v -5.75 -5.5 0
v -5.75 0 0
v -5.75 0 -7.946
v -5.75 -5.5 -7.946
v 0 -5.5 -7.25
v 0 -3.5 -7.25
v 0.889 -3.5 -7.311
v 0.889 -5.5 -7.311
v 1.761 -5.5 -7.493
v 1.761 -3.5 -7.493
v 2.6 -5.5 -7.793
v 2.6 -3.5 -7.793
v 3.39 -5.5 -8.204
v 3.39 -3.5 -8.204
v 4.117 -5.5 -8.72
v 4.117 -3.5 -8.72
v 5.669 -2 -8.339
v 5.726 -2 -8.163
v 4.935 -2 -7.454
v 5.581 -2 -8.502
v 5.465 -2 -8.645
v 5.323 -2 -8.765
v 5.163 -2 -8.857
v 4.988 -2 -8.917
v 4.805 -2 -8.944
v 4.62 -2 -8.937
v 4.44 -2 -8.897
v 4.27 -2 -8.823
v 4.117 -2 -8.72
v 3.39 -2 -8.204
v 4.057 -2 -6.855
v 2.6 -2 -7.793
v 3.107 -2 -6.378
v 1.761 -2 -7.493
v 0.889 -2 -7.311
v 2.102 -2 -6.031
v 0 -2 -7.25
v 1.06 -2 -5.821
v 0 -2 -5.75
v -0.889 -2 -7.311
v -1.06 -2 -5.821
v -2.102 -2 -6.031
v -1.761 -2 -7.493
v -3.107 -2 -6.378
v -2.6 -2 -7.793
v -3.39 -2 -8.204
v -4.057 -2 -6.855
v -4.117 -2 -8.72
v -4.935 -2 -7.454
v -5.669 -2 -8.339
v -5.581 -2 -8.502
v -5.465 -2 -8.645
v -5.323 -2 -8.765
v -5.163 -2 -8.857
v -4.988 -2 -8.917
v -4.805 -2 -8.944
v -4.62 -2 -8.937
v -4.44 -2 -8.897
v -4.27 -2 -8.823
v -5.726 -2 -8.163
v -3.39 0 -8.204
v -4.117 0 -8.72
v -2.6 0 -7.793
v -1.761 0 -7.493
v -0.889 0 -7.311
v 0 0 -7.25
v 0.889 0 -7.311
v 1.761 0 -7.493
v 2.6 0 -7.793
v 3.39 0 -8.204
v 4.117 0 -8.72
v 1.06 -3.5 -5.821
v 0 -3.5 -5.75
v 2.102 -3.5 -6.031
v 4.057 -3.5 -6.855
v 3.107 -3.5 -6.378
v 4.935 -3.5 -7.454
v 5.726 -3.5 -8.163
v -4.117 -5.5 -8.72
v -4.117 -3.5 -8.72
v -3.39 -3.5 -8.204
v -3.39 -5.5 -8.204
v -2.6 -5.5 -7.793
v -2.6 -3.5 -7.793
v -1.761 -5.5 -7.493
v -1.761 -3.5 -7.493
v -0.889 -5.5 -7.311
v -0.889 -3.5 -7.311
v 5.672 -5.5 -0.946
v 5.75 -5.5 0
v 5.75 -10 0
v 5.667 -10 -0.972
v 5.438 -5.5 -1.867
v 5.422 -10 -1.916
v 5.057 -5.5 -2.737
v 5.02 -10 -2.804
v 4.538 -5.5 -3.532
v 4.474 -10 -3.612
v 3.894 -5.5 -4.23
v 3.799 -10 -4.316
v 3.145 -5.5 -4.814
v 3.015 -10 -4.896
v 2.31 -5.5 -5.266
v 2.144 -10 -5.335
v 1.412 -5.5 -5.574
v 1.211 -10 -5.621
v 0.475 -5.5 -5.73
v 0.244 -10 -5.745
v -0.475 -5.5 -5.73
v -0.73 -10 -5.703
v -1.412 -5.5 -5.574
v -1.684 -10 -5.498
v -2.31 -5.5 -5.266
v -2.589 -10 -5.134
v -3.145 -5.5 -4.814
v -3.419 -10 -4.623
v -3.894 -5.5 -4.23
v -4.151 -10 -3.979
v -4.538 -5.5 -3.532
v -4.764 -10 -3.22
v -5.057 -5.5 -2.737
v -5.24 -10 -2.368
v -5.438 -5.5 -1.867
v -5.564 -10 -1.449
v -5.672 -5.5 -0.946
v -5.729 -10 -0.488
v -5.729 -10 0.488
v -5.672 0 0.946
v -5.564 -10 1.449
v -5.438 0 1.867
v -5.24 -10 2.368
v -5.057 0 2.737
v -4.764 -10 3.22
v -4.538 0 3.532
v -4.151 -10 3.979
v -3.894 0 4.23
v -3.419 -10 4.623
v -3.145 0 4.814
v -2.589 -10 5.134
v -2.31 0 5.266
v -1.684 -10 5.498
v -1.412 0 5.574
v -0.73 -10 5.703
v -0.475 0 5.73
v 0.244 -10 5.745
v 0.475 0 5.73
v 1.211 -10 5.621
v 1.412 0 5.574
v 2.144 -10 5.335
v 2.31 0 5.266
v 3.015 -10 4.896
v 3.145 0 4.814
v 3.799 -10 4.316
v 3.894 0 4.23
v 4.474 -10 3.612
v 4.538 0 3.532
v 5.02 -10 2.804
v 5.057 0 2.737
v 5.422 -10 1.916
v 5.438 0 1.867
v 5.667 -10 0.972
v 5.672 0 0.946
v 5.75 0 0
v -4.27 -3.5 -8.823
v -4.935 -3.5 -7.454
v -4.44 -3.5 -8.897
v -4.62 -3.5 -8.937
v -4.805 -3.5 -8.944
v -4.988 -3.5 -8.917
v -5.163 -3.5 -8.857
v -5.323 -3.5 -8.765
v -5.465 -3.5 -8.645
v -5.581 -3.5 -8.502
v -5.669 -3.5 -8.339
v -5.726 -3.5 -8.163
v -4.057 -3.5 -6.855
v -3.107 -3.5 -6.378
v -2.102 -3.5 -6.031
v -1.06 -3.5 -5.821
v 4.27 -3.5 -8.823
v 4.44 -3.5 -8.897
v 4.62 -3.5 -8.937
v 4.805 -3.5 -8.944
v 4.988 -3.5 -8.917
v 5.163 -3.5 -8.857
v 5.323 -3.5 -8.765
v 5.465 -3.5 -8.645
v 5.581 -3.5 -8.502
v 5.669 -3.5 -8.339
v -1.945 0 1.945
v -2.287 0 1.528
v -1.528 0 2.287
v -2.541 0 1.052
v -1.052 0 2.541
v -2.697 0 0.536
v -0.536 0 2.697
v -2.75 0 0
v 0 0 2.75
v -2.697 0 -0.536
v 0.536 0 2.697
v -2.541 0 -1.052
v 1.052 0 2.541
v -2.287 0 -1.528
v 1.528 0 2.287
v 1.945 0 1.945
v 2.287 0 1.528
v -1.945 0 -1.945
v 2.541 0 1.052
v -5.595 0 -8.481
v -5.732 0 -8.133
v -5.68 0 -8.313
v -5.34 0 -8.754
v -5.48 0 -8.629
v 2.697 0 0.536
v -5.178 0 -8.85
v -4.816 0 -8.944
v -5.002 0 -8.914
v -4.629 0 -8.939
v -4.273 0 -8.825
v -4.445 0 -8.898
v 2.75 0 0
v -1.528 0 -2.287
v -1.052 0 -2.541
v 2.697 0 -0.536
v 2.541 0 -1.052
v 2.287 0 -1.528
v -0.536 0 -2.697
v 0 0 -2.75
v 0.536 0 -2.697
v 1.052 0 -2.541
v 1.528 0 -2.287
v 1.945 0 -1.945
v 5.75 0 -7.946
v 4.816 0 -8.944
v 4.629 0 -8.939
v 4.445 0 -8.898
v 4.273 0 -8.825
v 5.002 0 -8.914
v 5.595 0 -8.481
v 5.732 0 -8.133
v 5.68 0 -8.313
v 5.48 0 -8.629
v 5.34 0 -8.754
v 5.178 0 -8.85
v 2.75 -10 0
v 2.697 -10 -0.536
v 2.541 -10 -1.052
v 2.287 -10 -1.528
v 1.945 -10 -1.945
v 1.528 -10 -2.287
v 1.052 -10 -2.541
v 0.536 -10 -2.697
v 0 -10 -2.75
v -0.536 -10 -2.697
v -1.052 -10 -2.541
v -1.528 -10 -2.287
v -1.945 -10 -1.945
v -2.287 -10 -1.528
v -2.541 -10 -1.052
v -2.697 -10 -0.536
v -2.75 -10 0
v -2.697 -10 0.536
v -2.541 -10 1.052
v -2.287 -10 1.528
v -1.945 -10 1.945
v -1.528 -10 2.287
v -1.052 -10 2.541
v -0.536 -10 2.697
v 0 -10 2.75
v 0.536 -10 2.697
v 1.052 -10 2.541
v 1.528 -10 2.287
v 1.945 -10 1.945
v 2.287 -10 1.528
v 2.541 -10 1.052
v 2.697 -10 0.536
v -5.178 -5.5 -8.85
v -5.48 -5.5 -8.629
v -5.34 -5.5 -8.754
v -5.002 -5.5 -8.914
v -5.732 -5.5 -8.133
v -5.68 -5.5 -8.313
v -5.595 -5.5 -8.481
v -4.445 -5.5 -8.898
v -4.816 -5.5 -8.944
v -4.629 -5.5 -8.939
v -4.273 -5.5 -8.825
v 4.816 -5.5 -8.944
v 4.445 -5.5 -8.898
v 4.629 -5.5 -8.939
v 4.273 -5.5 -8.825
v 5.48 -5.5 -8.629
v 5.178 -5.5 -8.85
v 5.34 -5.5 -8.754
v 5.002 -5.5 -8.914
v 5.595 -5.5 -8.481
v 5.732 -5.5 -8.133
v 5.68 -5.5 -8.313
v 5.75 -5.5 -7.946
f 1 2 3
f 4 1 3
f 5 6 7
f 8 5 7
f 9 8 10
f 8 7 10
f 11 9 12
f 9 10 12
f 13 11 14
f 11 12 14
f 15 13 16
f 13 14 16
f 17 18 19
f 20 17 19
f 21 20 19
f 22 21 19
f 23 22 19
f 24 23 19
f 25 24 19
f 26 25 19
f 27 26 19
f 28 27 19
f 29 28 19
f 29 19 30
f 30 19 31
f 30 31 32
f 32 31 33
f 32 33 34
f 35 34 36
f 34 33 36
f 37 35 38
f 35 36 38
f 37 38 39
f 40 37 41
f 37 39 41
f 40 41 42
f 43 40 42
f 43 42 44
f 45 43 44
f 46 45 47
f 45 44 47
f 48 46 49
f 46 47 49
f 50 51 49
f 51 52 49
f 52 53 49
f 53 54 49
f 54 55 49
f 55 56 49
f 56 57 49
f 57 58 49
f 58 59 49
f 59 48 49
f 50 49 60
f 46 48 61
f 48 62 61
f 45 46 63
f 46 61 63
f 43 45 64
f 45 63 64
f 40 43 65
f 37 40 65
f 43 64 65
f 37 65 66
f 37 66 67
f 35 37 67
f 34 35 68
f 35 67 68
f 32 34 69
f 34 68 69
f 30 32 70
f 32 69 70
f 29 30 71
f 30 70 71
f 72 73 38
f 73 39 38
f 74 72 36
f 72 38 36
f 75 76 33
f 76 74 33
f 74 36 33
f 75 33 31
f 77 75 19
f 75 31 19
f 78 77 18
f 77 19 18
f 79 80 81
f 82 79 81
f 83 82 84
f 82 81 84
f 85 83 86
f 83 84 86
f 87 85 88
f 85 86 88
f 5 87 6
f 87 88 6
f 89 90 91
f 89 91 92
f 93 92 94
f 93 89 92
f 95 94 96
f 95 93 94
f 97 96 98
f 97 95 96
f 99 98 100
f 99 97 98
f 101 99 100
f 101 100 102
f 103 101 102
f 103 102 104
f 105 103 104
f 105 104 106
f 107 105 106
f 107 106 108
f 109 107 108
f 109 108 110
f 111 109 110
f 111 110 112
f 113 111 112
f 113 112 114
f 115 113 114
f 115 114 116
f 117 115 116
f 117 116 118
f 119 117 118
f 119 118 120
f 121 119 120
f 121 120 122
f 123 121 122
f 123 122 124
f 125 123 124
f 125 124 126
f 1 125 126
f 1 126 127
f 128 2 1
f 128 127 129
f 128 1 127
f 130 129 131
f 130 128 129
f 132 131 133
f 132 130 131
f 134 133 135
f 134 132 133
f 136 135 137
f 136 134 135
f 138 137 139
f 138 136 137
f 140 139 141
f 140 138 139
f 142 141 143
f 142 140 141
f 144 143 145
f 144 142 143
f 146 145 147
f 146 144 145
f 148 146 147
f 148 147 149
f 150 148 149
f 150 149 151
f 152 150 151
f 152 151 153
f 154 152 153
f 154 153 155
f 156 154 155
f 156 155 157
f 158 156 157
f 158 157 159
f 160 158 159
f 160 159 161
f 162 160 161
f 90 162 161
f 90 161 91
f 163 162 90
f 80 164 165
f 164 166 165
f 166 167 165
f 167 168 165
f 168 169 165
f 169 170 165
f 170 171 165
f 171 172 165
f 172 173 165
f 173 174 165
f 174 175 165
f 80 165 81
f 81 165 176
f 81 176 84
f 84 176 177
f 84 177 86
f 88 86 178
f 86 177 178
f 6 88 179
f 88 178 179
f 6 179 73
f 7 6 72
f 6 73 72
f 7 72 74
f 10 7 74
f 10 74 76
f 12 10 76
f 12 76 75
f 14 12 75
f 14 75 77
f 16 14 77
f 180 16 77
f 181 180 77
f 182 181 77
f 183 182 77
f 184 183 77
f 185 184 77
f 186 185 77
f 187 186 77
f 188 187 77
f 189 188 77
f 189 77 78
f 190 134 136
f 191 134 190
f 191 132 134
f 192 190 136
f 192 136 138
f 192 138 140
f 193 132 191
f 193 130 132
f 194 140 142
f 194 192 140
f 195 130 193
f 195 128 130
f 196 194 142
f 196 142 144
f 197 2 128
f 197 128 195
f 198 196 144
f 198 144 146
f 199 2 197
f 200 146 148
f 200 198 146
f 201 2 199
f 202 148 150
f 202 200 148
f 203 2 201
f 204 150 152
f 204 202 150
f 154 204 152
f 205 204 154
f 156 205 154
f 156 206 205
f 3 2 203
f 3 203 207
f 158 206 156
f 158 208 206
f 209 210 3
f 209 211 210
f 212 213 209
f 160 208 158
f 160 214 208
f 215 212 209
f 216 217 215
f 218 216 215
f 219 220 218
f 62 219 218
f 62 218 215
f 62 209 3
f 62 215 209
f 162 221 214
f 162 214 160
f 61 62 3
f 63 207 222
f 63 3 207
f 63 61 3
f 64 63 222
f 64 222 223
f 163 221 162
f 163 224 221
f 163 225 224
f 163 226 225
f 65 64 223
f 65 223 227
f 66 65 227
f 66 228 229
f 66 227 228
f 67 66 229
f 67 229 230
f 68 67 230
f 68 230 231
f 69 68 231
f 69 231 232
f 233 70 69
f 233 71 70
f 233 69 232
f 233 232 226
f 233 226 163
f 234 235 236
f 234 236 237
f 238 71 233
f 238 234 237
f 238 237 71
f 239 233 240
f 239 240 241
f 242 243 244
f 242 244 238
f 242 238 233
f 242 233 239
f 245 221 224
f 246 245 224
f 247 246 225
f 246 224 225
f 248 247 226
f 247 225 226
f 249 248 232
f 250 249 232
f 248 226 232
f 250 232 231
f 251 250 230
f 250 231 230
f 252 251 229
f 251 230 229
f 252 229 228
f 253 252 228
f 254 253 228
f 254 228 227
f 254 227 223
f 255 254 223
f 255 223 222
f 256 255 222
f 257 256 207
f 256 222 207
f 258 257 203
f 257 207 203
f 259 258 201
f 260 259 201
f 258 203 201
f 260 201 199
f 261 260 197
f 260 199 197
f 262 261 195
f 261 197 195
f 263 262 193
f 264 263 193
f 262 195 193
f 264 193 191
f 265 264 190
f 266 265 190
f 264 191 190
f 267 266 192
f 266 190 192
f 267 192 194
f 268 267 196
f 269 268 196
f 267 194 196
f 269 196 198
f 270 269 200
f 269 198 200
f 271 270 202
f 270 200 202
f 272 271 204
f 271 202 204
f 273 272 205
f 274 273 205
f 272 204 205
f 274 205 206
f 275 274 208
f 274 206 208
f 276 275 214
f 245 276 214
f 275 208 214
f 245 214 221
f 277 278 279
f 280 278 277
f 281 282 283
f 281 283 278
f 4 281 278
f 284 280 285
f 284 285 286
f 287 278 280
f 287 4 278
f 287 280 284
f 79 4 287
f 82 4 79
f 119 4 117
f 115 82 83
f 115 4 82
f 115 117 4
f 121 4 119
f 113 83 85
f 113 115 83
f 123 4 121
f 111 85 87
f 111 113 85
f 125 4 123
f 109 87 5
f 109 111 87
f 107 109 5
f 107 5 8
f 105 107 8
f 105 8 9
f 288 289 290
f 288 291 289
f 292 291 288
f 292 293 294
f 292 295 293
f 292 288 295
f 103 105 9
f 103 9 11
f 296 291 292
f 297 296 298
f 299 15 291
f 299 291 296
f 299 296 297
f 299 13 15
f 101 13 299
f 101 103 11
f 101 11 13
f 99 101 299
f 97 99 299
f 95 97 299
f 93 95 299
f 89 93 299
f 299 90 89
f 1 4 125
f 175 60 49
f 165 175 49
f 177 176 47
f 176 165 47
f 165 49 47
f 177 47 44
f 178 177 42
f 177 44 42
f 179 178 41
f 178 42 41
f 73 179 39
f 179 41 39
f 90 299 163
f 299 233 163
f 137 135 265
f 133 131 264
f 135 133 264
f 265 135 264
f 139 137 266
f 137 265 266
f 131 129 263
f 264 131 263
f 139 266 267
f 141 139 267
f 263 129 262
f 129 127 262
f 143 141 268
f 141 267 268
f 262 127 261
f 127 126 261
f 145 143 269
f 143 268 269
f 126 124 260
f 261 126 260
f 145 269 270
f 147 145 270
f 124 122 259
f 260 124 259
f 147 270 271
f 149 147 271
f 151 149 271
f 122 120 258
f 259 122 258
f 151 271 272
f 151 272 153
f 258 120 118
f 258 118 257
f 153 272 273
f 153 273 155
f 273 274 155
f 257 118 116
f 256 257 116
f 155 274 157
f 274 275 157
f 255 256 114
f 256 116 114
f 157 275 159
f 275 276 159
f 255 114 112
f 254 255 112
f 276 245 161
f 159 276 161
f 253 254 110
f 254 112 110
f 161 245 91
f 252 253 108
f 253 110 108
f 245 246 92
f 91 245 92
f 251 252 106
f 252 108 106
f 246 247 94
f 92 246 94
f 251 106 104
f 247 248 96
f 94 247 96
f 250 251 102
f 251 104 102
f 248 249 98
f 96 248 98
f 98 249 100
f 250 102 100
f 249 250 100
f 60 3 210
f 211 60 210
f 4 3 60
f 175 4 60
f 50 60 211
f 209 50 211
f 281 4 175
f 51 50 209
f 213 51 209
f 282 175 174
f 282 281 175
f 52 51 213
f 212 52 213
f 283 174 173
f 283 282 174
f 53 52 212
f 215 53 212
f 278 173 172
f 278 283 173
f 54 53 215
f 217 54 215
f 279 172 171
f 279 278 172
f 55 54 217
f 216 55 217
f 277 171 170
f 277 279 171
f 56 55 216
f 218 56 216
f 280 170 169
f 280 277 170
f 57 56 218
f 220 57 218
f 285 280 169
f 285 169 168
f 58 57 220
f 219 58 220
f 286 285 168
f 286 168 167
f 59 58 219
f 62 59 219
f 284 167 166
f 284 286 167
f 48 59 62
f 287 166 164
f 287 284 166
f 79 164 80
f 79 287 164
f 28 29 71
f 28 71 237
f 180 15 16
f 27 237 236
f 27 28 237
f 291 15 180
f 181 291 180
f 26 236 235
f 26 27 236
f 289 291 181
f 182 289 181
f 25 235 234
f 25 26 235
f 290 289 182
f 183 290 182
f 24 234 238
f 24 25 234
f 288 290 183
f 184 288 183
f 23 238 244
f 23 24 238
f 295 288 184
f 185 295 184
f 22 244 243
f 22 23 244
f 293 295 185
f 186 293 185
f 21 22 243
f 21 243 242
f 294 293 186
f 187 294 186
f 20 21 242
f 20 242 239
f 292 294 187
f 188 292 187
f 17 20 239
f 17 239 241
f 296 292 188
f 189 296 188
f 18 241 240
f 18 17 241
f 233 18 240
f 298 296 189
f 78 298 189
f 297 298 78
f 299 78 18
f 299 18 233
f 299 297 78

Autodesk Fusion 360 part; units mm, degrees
sketch "Sketch1" plane through (0, 0, 0) normal (0, 1, 0) x (1, 0, 0)
  circle A0 centre (0, 0) radius 2.75
  circle A1 centre (0, 0) radius 5.75
  line L0 (-6, 0) -> (6, 0) construction
  dimension "d1" = 5.5
  dimension "d2" = 3
extrude "Extrude1" add sketch "Sketch1" against normal blind 10
sketch "Sketch2" plane through (0, 0, 0) normal (0, 1, 0) x (-1, 0, 0)
  circle A0 centre (0, 0) radius 2.75
  circle A1 centre (0, 0) radius 5.75
  line L0 (-6.5, 0) -> (6.5, 0) construction
  line L1 (0, -13.75) -> (0, 0) construction
  line L2 (-5.75, 0) -> (-5.75, -15) construction
  line L3 (5.75, 0) -> (5.75, -15) construction
  arc A2 (5.75, -10.7189) -> (0, -7.25) centre (0, -13.75) ccw
  arc A3 (0, -7.25) -> (-5.75, -10.7189) centre (0, -13.75) ccw
  line L4 (-5.75, -10.7189) -> (-5.75, 0)
  line L5 (5.75, -10.7189) -> (5.75, 0)
  dimension "d16" = 13.75
  dimension "d17" = 6.5
extrude "Extrude3" add sketch "Sketch2" against normal blind 2 contours A1 A2 A3 L4 L5
sketch "Sketch3" plane through (0, -2, 0) normal (0, -1, 0) x (1, 0, 0)
  arc A0 (5.75, -10.7189) -> (-5.75, -10.7189) centre (0, -13.75) ccw
  line L0 (5.75, -10.7189) -> (5.75, 0)
  arc A1 (-5.75, 0) -> (5.75, 0) centre (0, 0) ccw
  line L1 (-5.75, 0) -> (-5.75, -10.7189)
  arc A2 (5.75, -8.1879) -> (0, -5.75) centre (0, -13.75) ccw
  arc A3 (0, -5.75) -> (-5.75, -8.1879) centre (0, -13.75) ccw
  line L2 (-5.75, 0) -> (-5.75, -8.1879)
  line L3 (5.75, 0) -> (5.75, -8.1879)
  line L4 (-5.75, -8.1879) -> (0, -13.75) construction
  dimension "d24" = 8
extrude "Extrude4" add sketch "Sketch3" along normal blind 1.5 contours L0 A1 A2 L3 | A1 L1 A3 L2
sketch "Sketch5" plane through (0, -3.5, 0) normal (0, -1, 0) x (1, 0, 0)
  arc A0 (-5.75, 0) -> (0, -5.75) centre (0, 0) ccw
  line L0 (-5.75, 0) -> (-5.75, -8.1879)
  arc A1 (0, -5.75) -> (-5.75, -8.1879) centre (0, -13.75) ccw
  arc A2 (0, -7.25) -> (-5.75, -10.7189) centre (0, -13.75) ccw
  arc A3 (5.75, -10.7189) -> (0, -7.25) centre (0, -13.75) ccw
  line L1 (-5.75, -10.7189) -> (-5.75, 0)
  circle A4 centre (0, 0) radius 5.75
  line L2 (5.75, -10.7189) -> (5.75, 0)
  line L3 (0, -13.75) -> (0, 0)
  line L4 (0, -13.75) -> (-2.9897, -7.9784) construction
  dimension "d25" = 6.5
extrude "Extrude5" add sketch "Sketch5" along normal blind 2 contours A0 L0 A1 L1 A4 | A1 A2 L1 L3 | A3 A4 L2 L3
fillet "Fillet2" radius 1 2 edges at (5.75, -1, -10.7189) (5.75, -4.5, -10.7189)
fillet "Fillet4" radius 1 2 edges at (-5.75, -1, -10.7189) (-5.75, -4.5, -10.7189)
